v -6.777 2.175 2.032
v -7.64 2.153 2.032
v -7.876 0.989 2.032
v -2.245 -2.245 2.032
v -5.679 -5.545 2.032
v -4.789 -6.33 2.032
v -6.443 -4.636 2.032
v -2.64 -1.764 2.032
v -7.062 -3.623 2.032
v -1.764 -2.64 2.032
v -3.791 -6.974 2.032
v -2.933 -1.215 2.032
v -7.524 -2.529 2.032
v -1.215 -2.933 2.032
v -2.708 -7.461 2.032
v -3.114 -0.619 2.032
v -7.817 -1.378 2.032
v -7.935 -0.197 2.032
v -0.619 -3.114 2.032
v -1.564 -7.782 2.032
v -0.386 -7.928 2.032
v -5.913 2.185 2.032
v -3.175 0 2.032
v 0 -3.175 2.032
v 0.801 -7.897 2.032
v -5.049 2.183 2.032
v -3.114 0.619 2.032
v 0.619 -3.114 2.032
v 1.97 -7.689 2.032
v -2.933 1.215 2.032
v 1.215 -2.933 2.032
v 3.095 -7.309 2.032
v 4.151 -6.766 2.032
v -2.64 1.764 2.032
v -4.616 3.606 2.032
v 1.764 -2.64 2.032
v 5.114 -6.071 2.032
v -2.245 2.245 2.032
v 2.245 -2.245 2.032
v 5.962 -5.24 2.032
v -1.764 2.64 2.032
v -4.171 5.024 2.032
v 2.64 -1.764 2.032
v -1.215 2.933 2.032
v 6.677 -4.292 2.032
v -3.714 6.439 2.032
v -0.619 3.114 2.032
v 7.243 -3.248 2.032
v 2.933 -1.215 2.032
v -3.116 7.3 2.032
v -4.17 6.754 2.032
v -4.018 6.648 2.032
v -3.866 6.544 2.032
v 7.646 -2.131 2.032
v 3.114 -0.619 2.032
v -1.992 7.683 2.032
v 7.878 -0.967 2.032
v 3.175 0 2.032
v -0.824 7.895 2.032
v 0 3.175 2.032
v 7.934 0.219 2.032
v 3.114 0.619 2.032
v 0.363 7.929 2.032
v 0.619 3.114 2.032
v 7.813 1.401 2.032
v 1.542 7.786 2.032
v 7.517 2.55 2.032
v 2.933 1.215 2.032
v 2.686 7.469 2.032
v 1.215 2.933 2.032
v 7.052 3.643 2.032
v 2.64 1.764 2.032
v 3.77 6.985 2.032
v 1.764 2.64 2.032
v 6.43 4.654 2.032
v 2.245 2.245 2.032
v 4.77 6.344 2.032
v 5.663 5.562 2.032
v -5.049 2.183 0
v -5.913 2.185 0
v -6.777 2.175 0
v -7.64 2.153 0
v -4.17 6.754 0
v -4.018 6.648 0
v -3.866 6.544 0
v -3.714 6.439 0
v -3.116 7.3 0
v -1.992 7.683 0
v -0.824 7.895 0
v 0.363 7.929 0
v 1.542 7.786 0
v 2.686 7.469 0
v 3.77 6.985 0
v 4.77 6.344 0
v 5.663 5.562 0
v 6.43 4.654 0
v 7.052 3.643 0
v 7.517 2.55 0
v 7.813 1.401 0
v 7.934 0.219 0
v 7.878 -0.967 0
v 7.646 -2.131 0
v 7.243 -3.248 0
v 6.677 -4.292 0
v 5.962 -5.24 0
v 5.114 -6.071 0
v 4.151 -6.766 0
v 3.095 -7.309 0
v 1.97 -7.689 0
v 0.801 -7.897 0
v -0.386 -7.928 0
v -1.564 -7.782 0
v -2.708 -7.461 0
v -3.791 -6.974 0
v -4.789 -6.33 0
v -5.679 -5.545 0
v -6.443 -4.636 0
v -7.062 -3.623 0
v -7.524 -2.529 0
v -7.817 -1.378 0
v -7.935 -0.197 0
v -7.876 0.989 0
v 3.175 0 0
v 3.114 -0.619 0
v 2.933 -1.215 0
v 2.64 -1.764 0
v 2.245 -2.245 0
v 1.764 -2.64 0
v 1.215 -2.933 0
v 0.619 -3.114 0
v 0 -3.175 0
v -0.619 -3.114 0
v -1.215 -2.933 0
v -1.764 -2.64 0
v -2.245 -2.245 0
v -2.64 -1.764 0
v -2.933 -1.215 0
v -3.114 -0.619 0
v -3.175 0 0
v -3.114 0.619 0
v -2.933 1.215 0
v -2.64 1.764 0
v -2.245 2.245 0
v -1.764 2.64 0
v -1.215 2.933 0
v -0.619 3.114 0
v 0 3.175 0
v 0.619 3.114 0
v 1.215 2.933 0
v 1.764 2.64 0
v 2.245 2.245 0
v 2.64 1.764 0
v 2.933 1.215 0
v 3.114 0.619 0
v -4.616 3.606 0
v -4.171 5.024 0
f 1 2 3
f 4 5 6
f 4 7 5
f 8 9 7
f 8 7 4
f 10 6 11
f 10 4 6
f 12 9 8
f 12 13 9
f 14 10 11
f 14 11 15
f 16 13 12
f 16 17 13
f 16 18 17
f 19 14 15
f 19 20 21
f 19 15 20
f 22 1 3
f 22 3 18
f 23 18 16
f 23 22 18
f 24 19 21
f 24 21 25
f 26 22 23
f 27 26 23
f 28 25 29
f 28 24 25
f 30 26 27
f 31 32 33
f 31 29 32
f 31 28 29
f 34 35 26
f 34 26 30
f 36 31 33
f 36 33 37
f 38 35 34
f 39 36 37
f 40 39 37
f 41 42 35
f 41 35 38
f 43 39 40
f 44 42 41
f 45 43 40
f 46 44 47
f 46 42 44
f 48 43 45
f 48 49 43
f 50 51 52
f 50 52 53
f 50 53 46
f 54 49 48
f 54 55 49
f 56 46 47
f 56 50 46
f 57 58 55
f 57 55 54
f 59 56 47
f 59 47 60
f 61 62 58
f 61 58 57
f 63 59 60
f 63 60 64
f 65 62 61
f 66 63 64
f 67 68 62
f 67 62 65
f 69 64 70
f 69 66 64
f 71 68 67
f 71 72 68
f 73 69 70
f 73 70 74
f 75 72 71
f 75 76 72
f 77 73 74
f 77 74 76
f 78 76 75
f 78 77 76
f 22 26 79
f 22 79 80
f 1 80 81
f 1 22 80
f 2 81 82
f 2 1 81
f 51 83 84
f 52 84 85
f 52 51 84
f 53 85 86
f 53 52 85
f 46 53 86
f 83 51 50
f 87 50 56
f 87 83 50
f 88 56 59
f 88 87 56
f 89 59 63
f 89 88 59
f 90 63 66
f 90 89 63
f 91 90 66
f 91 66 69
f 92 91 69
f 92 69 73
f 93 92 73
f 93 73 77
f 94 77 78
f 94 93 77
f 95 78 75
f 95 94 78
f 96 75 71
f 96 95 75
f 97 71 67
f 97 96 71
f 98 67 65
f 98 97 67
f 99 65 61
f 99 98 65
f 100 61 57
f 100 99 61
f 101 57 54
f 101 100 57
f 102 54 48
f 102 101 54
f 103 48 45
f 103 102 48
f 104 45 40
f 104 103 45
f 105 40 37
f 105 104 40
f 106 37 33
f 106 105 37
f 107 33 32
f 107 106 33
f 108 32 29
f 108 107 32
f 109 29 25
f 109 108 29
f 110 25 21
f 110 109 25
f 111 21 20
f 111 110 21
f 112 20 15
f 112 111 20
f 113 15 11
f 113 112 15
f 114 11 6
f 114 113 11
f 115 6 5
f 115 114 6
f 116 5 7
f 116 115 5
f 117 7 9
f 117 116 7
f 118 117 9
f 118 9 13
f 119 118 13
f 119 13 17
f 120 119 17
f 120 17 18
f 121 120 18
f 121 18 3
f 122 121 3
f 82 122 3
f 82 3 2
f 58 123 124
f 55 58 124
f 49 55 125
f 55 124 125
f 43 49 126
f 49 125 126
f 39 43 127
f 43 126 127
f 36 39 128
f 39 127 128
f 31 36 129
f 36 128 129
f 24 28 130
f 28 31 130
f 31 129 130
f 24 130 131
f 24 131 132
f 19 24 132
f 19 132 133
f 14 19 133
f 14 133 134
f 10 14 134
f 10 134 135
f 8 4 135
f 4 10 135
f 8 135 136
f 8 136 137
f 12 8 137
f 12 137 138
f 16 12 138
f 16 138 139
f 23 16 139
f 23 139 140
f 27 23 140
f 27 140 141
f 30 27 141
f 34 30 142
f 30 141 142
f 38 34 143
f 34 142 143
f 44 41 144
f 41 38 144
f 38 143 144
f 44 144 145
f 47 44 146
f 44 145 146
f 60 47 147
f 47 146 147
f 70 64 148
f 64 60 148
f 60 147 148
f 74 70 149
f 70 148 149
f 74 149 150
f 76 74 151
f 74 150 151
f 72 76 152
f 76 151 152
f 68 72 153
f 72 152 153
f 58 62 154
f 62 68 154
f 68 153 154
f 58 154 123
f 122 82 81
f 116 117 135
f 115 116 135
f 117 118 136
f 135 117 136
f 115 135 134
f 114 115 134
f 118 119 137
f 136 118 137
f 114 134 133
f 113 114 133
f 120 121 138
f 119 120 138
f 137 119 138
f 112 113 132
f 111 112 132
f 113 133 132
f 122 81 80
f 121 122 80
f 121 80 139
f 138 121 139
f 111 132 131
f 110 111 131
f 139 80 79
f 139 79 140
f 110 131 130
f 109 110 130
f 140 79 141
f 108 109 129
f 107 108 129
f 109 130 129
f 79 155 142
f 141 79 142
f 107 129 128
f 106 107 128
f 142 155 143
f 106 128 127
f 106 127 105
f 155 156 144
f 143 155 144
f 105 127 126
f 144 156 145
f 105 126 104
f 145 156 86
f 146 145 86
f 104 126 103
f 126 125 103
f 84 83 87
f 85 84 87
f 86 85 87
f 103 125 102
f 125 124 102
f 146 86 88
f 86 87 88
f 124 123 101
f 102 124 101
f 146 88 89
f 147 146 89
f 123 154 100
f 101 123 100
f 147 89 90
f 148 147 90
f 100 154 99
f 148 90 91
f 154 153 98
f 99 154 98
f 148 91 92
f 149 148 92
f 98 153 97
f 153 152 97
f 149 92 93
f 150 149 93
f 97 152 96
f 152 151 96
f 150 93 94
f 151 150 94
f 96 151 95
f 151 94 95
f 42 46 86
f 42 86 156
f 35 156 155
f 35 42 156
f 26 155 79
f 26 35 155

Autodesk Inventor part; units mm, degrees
ref_plane "YZ Plane" through (0, 0, 0) normal (1, 0, 0) x (0, 1, 0)
ref_plane "XZ Plane" through (0, 0, 0) normal (0, 1, 0) x (-1, 0, 0)
ref_plane "XY Plane" through (0, 0, 0) normal (0, 0, 1) x (1, 0, 0)
sketch "Sketch1" plane through (0, 0, 0) normal (0, 0, 1) x (1, 0, 0)
  circle A0 centre (0, 0) radius 7.9375
  circle A1 centre (0, 0) radius 3.175
  dimension "d0" = 15.875
  dimension "d1" = 6.35
extrude "Extrusion1" add sketch "Sketch1" along normal blind 2.032
sketch "Sketch2" plane through (0, 0, 2.032) normal (0, 0, 1) x (1, 0, 0)
  circle A0 centre (0, 0) radius 7.9375 construction
  arc A1 (-5.0493, 2.1833) -> (-17.7625, 1.0248) centre (-5.5945, -62.1721) ccw projected
  arc A2 (-3.7141, 6.4391) -> (-5.0493, 2.1833) centre (163.5858, -48.389) ccw projected
  arc A3 (-13.4868, 14.6525) -> (-3.7141, 6.4391) centre (32.6027, 59.5711) ccw projected
  arc A4 (-4.1702, 6.7537) -> (-7.6399, 2.1531) centre (0, 0) ccw
extrude "Extrusion2" cut sketch "Sketch2" against normal blind 25.4
properties part number "Gear Washer Spacer 4" material "Steel"
